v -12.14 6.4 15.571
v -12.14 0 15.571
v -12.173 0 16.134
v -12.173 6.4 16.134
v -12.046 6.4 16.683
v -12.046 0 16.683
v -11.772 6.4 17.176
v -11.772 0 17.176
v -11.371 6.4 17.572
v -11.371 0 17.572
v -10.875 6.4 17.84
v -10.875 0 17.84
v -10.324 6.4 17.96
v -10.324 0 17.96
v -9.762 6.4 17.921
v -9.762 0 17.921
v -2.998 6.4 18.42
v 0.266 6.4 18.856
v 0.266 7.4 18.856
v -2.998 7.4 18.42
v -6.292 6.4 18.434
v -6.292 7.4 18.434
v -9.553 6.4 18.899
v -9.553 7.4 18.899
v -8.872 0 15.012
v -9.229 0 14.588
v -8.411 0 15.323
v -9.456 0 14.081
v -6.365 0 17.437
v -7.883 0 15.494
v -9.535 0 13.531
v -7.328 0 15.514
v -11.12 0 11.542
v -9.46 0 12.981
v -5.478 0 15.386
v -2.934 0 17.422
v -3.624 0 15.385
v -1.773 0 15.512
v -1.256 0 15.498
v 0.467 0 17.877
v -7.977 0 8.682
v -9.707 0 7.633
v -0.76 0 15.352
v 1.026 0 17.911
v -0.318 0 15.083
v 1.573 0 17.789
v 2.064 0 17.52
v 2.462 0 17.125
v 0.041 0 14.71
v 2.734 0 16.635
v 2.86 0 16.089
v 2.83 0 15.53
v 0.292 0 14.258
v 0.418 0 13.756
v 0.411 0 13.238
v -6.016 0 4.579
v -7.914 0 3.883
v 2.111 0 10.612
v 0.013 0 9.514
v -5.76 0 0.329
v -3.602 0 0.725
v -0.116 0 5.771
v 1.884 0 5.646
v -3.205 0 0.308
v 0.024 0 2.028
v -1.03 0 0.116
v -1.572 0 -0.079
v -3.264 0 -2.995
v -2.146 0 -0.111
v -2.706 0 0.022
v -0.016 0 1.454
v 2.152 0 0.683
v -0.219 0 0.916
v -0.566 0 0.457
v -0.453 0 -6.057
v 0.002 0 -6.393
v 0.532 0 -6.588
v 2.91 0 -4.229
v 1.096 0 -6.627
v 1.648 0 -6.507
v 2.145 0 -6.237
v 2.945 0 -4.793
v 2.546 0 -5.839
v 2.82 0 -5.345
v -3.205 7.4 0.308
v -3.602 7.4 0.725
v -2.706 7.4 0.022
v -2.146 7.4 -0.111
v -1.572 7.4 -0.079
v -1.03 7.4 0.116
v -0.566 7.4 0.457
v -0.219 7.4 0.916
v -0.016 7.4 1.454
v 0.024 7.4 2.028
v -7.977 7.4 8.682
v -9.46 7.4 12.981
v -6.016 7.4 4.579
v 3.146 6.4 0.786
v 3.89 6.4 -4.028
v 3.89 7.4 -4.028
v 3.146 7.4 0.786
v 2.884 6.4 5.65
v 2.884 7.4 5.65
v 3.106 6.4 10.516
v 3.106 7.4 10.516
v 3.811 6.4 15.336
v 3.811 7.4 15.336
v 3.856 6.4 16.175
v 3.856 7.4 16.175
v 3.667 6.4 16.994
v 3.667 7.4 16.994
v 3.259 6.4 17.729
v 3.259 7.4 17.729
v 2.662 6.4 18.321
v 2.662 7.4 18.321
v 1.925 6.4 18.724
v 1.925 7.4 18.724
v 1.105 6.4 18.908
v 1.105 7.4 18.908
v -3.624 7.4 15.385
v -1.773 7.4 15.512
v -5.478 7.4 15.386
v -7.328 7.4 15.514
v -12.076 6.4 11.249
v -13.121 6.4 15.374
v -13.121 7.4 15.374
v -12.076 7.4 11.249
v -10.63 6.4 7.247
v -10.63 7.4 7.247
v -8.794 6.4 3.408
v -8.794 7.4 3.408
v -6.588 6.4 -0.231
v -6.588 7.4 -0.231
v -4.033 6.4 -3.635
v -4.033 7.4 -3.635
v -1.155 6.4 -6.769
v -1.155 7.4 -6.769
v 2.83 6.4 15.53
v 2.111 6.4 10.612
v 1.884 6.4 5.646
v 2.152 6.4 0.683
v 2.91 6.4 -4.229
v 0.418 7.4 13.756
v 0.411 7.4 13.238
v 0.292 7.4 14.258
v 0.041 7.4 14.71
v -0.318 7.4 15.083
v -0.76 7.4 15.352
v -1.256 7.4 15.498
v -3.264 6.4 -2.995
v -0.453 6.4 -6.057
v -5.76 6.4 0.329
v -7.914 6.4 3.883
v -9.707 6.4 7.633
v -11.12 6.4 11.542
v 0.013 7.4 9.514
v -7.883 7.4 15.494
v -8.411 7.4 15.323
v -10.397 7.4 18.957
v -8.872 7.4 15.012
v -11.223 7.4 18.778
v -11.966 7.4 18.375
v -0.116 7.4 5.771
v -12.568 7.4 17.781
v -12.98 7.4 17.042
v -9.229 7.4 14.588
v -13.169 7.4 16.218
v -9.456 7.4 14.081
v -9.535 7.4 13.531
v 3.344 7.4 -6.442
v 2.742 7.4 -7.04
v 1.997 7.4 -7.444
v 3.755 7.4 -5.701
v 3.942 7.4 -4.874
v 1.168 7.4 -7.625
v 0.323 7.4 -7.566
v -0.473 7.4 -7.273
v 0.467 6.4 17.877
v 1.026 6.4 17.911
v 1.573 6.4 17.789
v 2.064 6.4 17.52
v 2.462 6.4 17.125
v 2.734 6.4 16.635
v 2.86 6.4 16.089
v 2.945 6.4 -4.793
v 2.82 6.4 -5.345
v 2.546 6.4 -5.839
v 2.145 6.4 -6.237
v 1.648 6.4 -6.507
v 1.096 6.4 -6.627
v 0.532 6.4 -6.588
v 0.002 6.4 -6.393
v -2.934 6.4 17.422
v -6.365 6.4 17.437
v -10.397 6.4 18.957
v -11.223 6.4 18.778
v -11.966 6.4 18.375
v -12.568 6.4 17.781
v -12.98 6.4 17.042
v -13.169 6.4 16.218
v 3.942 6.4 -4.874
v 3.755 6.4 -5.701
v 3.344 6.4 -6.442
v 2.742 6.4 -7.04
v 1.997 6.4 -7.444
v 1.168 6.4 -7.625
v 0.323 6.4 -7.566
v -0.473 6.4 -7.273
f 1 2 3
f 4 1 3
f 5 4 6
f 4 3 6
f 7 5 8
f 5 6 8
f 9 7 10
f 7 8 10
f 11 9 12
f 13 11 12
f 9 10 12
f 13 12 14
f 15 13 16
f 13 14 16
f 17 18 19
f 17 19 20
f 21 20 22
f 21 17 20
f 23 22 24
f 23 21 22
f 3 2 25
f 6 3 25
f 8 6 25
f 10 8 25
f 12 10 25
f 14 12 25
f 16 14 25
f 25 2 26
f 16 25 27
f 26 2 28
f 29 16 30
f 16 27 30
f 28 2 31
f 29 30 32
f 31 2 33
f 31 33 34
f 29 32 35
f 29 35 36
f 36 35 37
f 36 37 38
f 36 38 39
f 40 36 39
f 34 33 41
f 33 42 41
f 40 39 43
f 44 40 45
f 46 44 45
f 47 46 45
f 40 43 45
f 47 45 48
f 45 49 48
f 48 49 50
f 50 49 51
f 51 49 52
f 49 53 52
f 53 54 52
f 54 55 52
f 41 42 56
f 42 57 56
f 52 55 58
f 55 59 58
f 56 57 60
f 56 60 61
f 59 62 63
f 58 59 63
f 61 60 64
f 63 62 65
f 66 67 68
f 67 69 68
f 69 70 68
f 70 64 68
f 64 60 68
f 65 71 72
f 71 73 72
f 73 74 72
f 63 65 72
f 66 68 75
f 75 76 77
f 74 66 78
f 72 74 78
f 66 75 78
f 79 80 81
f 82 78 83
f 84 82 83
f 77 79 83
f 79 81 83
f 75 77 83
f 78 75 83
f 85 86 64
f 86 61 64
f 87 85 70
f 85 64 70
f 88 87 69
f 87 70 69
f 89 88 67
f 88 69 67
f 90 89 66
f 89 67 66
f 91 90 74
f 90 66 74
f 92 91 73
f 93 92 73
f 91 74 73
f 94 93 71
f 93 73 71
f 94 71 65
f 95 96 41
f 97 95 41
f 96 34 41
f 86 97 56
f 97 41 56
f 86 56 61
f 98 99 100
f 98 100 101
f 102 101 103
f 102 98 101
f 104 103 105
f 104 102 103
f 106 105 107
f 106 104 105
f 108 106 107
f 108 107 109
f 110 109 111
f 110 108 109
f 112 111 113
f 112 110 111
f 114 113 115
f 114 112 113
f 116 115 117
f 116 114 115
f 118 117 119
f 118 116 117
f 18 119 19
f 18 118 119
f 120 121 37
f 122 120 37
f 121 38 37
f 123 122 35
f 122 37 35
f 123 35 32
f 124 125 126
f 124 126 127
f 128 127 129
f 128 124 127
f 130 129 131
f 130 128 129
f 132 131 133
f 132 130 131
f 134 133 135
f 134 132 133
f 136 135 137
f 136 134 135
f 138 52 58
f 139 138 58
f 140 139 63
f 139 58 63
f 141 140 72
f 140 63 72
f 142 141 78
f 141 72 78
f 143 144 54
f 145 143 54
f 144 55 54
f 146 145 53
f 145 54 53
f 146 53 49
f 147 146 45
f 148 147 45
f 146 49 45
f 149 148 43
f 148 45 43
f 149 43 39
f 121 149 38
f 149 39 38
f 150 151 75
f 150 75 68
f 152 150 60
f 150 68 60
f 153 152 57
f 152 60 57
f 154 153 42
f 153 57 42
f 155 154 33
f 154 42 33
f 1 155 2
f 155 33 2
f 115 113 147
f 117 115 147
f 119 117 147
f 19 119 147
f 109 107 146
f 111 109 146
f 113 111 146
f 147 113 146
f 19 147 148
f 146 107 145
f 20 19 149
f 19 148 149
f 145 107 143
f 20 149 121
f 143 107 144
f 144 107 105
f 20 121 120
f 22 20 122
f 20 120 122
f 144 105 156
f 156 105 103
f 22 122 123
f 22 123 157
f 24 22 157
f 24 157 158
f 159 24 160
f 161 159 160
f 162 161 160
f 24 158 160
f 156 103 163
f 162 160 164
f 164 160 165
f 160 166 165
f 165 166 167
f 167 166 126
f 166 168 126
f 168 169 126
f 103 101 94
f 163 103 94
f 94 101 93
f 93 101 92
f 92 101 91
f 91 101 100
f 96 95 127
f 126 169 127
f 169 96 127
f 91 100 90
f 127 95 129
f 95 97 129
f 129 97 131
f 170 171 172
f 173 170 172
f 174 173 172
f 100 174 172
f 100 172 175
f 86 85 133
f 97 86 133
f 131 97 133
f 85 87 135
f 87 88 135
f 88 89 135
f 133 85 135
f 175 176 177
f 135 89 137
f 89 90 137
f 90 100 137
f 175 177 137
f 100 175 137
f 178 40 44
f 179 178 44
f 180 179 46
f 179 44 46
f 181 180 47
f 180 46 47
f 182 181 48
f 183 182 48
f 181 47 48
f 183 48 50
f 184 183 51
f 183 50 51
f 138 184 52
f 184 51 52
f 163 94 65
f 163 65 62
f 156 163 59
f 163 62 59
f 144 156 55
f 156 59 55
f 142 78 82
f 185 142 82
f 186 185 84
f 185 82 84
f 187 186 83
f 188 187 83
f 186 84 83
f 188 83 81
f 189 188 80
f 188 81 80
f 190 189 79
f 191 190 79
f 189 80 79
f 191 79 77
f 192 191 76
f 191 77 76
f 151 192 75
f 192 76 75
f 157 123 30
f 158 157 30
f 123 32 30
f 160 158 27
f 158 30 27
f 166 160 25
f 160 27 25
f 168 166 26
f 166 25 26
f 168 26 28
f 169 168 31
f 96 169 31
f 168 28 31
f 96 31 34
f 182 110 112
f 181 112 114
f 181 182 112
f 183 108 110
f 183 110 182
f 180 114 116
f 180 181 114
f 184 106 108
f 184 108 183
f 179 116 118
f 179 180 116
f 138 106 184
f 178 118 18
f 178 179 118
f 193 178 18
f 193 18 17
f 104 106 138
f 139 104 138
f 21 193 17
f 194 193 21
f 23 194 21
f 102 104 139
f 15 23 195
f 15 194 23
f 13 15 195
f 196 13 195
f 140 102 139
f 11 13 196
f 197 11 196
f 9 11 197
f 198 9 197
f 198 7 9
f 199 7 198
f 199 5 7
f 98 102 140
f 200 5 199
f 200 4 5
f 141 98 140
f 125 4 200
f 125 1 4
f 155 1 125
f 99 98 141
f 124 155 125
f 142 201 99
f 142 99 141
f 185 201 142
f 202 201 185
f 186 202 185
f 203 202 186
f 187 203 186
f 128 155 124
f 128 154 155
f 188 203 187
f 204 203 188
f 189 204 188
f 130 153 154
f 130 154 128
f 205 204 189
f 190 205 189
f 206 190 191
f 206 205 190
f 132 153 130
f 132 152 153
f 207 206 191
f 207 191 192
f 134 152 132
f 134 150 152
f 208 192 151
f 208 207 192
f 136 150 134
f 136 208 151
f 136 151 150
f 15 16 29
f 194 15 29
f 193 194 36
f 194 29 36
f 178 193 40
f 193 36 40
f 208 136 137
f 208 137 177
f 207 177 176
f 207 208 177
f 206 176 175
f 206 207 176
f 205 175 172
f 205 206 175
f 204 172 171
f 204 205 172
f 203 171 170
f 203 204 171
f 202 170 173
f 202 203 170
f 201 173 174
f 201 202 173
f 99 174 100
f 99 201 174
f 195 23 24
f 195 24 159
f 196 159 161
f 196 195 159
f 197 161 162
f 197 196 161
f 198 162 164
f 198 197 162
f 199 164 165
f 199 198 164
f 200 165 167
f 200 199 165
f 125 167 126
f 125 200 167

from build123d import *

# Parameters (mm, degrees)
EXTRUDE_1_DEPTH = 6.4
EXTRUDE_2_DEPTH = 1


with BuildPart() as part:
    # 草图1 → 凸台-拉伸1 (new body)
    with BuildSketch(Plane(origin=(0, 0, 0), x_dir=(1, 0, 0), z_dir=(0, 1, 0))):
        with BuildLine():
            ThreePointArc((2.829565104, -15.529906263), (1.88418981, -5.646325328), (2.910376158, 4.229192286))
            ThreePointArc((2.910376158, 4.229192286), (1.906294085, 6.389735523), (-0.452755984, 6.056552897))
            ThreePointArc((-0.452755984, 6.056552897), (-7.914394861, -3.882962322), (-12.140415639, -15.571023149))
            ThreePointArc((-12.140415639, -15.571023149), (-11.58539557, -17.387944), (-9.761966891, -17.92119489))
            ThreePointArc((-9.761966891, -17.92119489), (-4.64989516, -17.37013276), (0.466793237, -17.876538427))
            ThreePointArc((0.466793237, -17.876538427), (2.276755445, -17.336121852), (2.829565104, -15.529906263))
        make_face()
        with BuildLine():
            ThreePointArc((-3.602001562, -0.725023821), (-7.054850169, -6.602735021), (-9.459511378, -12.981391378))
            ThreePointArc((-9.459511378, -12.981391378), (-9.06507879, -14.812553198), (-7.328283633, -15.514175078))
            ThreePointArc((-7.328283633, -15.514175078), (-4.550929201, -15.369896432), (-1.773466789, -15.512081246))
            ThreePointArc((-1.773466789, -15.512081246), (-0.126352502, -14.908348224), (0.411230412, -13.238472884))
            ThreePointArc((0.411230412, -13.238472884), (-0.085305514, -7.64386169), (0.024455921, -2.028331904))
            ThreePointArc((0.024455921, -2.028331904), (-1.293712746, 0.000827838), (-3.602001562, -0.725023821))
        make_face(mode=Mode.SUBTRACT)
    extrude(amount=EXTRUDE_1_DEPTH)

    # 草图2 → 凸台-拉伸2 (add)
    with BuildSketch(Plane(origin=(0, 6.4, 0), x_dir=(1, 0, 0), z_dir=(0, 1, 0))):
        with BuildLine():
            ThreePointArc((3.889844067, 4.027592153), (2.884181446, -5.650415109), (3.810649235, -15.336324425))
            ThreePointArc((3.810649235, -15.336324425), (2.981434747, -18.045647807), (0.266491434, -18.85627267))
            ThreePointArc((0.266491434, -18.85627267), (-4.645529427, -18.370123231), (-9.553118288, -18.899142875))
            ThreePointArc((-9.553118288, -18.899142875), (-12.288261307, -18.09926654), (-13.120791411, -15.373885263))
            ThreePointArc((-13.120791411, -15.373885263), (-8.794151091, -3.407537273), (-1.154854145, 6.768633069))
            ThreePointArc((-1.154854145, 6.768633069), (2.383720959, 7.268407009), (3.889844067, 4.027592153))
        make_face()
        with BuildLine():
            ThreePointArc((0.024455921, -2.028331904), (-0.085305514, -7.64386169), (0.411230412, -13.238472884))
            ThreePointArc((0.411230412, -13.238472884), (-0.126352502, -14.908348224), (-1.773466789, -15.512081246))
            ThreePointArc((-1.773466789, -15.512081246), (-4.550929201, -15.369896432), (-7.328283633, -15.514175078))
            ThreePointArc((-7.328283633, -15.514175078), (-9.06507879, -14.812553198), (-9.459511378, -12.981391378))
            ThreePointArc((-9.459511378, -12.981391378), (-7.054850169, -6.602735021), (-3.602001562, -0.725023821))
            ThreePointArc((-3.602001562, -0.725023821), (-1.293712746, 0.000827838), (0.024455921, -2.028331904))
        make_face(mode=Mode.SUBTRACT)
    extrude(amount=EXTRUDE_2_DEPTH)


solid = part.part
